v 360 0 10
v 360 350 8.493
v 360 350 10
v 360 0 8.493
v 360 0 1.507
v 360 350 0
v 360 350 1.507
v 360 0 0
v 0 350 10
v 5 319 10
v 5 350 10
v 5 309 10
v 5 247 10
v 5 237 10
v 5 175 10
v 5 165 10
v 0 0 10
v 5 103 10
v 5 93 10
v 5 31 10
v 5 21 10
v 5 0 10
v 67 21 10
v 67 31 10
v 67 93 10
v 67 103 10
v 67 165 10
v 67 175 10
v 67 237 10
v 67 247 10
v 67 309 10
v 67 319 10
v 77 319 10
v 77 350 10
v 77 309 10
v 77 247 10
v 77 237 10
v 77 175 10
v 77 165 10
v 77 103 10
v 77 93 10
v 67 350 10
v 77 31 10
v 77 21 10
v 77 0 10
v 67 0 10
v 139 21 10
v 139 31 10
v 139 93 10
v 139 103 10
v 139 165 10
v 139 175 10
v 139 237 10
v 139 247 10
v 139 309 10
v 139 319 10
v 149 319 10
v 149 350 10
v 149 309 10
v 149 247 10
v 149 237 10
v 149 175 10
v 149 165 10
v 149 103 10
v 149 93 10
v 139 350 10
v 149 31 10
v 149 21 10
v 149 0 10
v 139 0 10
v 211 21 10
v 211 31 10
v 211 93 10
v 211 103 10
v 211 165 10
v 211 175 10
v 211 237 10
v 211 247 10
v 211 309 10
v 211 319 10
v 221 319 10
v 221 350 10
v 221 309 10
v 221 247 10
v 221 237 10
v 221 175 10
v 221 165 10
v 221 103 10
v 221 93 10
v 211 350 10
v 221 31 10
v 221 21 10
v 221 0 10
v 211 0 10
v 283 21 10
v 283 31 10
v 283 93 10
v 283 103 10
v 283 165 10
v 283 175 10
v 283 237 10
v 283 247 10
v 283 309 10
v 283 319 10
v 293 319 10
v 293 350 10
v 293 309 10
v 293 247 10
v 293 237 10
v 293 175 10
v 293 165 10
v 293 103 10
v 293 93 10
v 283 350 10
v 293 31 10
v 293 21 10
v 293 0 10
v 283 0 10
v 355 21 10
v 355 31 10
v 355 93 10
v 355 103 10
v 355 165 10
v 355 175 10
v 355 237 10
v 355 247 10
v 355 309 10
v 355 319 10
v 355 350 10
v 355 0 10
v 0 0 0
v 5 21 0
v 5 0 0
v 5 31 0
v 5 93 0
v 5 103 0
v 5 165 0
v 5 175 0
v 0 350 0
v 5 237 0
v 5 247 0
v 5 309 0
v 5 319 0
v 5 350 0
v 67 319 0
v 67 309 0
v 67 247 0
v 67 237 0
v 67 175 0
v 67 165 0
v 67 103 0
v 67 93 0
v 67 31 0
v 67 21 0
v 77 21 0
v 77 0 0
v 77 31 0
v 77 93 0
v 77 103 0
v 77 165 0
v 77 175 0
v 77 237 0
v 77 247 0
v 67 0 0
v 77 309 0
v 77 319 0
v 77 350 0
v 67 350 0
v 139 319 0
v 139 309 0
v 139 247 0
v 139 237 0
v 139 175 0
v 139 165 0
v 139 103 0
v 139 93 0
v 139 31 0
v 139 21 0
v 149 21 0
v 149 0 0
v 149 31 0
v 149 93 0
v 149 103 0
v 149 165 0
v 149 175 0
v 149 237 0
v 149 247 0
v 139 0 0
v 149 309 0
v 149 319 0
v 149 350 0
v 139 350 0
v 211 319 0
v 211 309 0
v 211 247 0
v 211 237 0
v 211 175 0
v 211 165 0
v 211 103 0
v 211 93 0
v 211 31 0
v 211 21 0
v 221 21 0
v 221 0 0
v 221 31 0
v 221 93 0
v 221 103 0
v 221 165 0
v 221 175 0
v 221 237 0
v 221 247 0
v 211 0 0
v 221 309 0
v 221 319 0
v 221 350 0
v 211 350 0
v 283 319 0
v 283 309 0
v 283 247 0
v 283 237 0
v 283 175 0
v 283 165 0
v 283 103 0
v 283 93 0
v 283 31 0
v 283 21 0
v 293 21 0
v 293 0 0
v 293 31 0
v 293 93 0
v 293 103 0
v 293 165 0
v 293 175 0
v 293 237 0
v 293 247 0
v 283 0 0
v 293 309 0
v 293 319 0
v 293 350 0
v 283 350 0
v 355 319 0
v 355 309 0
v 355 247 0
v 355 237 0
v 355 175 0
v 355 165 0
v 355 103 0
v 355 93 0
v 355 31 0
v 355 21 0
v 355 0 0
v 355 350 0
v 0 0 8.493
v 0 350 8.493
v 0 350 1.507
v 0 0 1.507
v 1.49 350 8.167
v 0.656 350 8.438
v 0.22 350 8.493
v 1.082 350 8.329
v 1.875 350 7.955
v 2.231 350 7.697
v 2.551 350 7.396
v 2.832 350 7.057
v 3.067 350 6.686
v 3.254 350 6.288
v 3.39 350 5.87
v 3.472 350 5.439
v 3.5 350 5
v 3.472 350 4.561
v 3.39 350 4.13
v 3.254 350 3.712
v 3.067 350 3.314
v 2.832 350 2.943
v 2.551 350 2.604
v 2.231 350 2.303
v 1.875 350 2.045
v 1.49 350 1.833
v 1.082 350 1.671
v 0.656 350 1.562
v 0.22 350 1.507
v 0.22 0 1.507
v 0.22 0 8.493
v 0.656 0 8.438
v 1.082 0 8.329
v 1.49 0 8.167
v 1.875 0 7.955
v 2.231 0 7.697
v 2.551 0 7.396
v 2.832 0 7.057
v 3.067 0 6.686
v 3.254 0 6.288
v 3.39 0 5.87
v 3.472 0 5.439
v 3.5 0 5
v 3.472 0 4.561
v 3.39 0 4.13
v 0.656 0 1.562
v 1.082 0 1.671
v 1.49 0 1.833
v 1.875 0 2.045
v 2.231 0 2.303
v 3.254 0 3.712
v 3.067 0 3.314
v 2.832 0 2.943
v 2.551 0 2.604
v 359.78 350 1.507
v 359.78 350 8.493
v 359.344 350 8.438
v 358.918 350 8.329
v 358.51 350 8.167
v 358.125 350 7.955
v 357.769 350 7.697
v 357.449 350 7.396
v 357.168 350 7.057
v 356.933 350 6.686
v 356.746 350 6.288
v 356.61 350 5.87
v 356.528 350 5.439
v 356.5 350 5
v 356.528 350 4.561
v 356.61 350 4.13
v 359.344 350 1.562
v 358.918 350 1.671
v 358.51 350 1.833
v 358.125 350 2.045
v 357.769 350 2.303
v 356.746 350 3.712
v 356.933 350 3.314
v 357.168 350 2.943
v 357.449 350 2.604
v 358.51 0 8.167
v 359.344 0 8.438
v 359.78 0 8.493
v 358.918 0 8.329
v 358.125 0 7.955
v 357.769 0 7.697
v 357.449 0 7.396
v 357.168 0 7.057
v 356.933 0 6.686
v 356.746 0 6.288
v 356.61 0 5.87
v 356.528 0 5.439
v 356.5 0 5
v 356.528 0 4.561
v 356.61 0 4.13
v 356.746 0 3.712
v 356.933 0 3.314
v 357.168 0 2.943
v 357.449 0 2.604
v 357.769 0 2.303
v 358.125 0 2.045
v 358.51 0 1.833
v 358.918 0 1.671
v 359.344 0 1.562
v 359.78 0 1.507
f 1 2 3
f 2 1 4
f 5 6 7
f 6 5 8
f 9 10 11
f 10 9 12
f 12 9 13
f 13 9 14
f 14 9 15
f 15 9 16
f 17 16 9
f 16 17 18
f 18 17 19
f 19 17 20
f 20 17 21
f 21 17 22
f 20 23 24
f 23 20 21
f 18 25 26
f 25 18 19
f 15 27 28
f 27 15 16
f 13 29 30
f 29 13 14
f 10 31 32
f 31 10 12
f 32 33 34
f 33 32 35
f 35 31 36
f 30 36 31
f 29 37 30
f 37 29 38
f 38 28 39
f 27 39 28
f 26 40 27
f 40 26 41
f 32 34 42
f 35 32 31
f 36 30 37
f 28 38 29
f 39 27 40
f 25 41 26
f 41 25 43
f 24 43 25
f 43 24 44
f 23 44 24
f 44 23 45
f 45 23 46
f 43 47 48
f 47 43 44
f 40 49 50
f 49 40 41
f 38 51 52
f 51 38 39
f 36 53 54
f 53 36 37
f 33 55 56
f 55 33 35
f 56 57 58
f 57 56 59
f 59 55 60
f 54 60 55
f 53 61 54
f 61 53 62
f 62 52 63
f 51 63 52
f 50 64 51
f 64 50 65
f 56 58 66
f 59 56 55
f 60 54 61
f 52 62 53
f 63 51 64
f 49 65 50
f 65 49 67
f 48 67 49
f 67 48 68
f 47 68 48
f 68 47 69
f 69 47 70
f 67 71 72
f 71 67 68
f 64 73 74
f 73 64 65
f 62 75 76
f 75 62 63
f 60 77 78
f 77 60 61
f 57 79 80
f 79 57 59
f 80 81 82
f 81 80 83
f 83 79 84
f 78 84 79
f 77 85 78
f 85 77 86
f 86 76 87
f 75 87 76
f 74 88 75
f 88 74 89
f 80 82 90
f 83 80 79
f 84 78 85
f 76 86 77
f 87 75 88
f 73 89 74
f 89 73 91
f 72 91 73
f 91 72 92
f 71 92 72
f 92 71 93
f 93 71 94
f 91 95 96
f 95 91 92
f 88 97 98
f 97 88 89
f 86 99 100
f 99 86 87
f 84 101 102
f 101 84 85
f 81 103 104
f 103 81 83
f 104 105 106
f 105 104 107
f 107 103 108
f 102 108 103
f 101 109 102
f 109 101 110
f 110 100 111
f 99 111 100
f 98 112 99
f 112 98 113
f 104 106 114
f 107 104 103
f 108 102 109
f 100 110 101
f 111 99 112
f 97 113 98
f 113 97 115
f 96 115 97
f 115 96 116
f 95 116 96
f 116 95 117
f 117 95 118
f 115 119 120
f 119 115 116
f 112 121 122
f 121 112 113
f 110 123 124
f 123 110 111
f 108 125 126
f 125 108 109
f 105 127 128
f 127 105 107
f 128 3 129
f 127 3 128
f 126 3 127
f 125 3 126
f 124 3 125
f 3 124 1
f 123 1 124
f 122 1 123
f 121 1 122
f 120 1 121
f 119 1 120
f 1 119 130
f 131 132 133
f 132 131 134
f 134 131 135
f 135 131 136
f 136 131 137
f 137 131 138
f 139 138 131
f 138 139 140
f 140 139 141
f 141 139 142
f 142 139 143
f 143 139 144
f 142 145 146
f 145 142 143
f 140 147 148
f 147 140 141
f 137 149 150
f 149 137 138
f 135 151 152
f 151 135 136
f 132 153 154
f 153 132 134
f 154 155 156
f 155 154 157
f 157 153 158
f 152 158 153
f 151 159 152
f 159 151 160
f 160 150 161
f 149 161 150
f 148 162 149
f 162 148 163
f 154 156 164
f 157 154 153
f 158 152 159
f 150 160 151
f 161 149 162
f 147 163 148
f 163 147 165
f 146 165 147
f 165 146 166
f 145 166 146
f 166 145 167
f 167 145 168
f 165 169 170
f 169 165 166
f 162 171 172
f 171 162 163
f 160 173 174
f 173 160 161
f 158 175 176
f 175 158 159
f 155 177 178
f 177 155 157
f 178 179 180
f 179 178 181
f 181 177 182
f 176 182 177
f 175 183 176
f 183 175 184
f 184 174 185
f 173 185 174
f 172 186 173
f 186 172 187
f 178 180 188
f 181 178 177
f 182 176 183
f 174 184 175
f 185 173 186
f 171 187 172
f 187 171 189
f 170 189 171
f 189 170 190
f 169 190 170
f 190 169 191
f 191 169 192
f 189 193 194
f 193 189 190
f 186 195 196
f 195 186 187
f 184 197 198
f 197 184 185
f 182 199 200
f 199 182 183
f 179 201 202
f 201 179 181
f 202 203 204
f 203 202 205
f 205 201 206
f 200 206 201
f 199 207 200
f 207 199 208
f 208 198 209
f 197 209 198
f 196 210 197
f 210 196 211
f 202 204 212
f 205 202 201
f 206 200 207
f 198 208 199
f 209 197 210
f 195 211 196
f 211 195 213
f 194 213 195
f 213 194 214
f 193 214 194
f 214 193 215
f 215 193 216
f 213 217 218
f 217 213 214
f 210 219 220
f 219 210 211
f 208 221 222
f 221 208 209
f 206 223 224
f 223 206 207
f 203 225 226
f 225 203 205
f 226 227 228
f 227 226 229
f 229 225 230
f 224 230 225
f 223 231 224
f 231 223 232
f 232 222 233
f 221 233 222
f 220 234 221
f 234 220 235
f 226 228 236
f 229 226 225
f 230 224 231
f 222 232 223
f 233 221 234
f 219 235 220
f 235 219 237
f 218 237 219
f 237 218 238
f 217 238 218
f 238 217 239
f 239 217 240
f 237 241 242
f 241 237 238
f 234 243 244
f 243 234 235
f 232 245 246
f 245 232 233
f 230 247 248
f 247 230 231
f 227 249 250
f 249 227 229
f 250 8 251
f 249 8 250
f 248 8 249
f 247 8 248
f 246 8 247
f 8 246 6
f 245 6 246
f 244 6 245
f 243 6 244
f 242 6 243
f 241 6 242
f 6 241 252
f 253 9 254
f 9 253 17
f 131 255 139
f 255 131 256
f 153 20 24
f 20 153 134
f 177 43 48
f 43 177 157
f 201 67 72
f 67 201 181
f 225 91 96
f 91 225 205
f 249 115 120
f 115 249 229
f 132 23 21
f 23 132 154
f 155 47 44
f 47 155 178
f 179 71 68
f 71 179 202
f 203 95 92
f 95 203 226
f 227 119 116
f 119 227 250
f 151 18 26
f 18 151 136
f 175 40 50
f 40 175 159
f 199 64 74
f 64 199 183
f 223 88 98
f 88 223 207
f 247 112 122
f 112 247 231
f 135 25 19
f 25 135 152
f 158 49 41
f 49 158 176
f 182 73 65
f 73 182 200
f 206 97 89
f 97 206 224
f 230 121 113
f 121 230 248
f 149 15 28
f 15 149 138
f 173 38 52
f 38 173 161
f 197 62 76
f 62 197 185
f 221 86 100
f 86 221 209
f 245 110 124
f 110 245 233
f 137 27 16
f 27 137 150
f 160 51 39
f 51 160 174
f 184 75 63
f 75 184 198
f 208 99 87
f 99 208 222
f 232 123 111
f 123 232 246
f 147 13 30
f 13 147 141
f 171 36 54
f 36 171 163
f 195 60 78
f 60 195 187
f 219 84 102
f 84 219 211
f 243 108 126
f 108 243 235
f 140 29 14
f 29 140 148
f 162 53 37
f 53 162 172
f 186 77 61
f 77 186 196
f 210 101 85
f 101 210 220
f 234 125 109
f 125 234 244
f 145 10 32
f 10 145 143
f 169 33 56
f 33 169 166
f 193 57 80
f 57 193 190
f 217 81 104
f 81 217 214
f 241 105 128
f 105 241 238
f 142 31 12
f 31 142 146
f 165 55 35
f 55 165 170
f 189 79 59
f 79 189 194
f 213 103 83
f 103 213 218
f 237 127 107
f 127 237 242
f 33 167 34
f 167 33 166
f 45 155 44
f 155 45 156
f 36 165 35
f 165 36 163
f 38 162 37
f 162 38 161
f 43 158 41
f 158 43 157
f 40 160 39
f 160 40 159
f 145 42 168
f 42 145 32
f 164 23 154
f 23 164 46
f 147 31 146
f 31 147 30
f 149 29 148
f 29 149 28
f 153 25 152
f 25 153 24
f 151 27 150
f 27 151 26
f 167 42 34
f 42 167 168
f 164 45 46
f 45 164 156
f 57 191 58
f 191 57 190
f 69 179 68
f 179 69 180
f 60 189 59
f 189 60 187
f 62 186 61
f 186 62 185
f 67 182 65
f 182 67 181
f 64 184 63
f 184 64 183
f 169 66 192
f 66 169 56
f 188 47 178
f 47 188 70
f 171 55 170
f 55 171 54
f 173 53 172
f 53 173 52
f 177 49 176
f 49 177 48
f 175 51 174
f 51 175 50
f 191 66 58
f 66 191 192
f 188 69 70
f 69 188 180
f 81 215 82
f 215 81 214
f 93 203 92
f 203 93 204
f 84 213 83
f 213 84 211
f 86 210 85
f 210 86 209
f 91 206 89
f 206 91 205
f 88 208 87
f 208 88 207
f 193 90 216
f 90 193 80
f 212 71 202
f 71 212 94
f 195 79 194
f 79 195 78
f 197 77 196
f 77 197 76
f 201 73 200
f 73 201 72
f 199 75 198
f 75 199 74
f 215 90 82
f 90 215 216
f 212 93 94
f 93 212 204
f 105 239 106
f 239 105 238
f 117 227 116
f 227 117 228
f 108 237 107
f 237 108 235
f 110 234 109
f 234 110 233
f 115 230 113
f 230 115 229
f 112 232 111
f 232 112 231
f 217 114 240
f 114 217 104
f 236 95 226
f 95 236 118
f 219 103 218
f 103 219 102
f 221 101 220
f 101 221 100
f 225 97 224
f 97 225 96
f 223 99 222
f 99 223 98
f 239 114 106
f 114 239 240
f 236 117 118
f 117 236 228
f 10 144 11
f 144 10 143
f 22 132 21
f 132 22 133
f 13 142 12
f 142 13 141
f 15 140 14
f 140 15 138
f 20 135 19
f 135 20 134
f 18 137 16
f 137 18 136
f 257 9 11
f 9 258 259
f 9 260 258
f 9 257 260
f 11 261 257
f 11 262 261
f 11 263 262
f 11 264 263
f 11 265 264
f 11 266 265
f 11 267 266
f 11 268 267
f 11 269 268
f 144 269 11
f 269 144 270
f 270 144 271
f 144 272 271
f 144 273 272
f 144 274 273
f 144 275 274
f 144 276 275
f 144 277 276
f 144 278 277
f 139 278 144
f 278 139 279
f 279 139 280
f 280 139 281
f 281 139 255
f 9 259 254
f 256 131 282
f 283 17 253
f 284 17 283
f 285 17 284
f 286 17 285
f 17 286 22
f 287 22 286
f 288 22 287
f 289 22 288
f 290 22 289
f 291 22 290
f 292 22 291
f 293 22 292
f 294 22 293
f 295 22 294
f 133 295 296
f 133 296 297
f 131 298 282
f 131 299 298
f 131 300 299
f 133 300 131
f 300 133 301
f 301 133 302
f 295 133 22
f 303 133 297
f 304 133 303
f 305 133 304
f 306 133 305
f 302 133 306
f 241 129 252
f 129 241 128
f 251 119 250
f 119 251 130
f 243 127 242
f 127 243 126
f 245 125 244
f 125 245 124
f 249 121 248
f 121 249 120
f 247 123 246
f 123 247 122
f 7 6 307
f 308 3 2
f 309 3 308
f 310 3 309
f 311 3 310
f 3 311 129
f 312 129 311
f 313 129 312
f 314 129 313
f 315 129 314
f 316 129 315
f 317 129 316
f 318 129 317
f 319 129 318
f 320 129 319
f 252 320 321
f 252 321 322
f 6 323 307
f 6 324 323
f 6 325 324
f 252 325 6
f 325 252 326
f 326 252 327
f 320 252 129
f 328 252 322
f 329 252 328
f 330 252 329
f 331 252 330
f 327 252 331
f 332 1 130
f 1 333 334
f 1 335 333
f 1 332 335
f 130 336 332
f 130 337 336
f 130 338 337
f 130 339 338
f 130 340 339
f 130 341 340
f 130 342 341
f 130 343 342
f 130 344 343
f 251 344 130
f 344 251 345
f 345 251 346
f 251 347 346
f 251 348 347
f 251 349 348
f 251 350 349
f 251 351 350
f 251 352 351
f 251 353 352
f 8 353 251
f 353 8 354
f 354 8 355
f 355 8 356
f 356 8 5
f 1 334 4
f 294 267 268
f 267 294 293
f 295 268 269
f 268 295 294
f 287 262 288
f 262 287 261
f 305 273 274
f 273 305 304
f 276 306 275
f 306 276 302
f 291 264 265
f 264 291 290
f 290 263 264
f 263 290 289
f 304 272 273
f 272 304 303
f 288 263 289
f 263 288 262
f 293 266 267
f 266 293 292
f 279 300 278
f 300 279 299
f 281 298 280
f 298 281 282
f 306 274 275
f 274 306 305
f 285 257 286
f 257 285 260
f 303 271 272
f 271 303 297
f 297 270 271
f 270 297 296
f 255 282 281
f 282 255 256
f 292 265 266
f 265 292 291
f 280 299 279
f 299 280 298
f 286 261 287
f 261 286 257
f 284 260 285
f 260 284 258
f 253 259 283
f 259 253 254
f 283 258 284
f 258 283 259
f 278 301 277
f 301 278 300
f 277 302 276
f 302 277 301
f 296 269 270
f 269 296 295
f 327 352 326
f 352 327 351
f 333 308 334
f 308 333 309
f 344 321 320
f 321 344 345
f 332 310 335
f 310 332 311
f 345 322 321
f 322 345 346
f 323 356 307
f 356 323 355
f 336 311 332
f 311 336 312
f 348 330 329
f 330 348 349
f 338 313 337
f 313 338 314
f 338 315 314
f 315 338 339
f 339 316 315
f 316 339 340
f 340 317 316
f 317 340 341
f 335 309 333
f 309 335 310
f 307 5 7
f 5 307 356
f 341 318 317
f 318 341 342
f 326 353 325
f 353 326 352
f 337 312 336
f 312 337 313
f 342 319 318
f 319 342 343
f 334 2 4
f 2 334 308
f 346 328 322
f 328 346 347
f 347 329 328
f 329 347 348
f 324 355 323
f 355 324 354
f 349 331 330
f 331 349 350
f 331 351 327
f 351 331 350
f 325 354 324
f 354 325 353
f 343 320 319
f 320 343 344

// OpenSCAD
difference() {
union() {
translate([67,0,0]) cube([10,350,10]);
translate([139,0,0]) cube([10,350,10]);
translate([211,0,0]) cube([10,350,10]);
translate([283,0,0]) cube([10,350,10]);
h = [26,98,170,242,314];
for (c = h) {
translate([0, c-5,0]) cube([360,10,10]);
}
translate([0,0,0]) cube([5,350,10]);
translate([355,0,0]) cube([5,350,10]);
}
intersection() {
translate([0,175,5]) rotate([90,0,0]) cylinder(h=352, r=3.5, $fn=50, center=true);
translate([0,0,0]) cube([10,350,10]);
}
intersection() {
translate([360,175,5]) rotate([90,0,0]) cylinder(h=352, r=3.5, $fn=50, center=true);
translate([350,0,0]) cube([10,350,10]);
}
}
